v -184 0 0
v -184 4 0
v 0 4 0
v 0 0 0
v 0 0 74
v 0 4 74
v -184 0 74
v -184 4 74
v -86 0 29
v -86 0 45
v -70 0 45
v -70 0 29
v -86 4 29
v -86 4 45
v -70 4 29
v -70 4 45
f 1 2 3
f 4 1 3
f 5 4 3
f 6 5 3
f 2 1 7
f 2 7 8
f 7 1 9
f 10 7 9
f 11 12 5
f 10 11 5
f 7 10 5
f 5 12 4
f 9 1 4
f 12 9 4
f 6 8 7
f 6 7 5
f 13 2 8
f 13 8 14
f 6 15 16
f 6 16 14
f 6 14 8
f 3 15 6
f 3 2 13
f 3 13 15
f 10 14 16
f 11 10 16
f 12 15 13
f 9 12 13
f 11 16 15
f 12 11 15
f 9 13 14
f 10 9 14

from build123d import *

# Parameters (mm, degrees)
SKETCH1_W           = 184
SKETCH1_H           = 4
BOSS_EXTRUDE1_DEPTH = 74
CUT_EXTRUDE1_DEPTH  = 74


with BuildPart() as part:
    # Sketch1 → Boss-Extrude1 (new body)
    with BuildSketch(Plane.XY):
        with Locations((-92, 2)):
            Rectangle(SKETCH1_W, SKETCH1_H)
    extrude(amount=BOSS_EXTRUDE1_DEPTH)

    # Sketch2 → Cut-Extrude1 (cut)
    with BuildSketch(Plane(origin=(0, 4, 0), x_dir=(1, 0, 0), z_dir=(0, 1, 0))):
        Polygon((-70, -37), (-70, -29), (-86, -29), (-86, -45), (-70, -45), align=None)
    extrude(amount=-CUT_EXTRUDE1_DEPTH, mode=Mode.SUBTRACT)


solid = part.part
